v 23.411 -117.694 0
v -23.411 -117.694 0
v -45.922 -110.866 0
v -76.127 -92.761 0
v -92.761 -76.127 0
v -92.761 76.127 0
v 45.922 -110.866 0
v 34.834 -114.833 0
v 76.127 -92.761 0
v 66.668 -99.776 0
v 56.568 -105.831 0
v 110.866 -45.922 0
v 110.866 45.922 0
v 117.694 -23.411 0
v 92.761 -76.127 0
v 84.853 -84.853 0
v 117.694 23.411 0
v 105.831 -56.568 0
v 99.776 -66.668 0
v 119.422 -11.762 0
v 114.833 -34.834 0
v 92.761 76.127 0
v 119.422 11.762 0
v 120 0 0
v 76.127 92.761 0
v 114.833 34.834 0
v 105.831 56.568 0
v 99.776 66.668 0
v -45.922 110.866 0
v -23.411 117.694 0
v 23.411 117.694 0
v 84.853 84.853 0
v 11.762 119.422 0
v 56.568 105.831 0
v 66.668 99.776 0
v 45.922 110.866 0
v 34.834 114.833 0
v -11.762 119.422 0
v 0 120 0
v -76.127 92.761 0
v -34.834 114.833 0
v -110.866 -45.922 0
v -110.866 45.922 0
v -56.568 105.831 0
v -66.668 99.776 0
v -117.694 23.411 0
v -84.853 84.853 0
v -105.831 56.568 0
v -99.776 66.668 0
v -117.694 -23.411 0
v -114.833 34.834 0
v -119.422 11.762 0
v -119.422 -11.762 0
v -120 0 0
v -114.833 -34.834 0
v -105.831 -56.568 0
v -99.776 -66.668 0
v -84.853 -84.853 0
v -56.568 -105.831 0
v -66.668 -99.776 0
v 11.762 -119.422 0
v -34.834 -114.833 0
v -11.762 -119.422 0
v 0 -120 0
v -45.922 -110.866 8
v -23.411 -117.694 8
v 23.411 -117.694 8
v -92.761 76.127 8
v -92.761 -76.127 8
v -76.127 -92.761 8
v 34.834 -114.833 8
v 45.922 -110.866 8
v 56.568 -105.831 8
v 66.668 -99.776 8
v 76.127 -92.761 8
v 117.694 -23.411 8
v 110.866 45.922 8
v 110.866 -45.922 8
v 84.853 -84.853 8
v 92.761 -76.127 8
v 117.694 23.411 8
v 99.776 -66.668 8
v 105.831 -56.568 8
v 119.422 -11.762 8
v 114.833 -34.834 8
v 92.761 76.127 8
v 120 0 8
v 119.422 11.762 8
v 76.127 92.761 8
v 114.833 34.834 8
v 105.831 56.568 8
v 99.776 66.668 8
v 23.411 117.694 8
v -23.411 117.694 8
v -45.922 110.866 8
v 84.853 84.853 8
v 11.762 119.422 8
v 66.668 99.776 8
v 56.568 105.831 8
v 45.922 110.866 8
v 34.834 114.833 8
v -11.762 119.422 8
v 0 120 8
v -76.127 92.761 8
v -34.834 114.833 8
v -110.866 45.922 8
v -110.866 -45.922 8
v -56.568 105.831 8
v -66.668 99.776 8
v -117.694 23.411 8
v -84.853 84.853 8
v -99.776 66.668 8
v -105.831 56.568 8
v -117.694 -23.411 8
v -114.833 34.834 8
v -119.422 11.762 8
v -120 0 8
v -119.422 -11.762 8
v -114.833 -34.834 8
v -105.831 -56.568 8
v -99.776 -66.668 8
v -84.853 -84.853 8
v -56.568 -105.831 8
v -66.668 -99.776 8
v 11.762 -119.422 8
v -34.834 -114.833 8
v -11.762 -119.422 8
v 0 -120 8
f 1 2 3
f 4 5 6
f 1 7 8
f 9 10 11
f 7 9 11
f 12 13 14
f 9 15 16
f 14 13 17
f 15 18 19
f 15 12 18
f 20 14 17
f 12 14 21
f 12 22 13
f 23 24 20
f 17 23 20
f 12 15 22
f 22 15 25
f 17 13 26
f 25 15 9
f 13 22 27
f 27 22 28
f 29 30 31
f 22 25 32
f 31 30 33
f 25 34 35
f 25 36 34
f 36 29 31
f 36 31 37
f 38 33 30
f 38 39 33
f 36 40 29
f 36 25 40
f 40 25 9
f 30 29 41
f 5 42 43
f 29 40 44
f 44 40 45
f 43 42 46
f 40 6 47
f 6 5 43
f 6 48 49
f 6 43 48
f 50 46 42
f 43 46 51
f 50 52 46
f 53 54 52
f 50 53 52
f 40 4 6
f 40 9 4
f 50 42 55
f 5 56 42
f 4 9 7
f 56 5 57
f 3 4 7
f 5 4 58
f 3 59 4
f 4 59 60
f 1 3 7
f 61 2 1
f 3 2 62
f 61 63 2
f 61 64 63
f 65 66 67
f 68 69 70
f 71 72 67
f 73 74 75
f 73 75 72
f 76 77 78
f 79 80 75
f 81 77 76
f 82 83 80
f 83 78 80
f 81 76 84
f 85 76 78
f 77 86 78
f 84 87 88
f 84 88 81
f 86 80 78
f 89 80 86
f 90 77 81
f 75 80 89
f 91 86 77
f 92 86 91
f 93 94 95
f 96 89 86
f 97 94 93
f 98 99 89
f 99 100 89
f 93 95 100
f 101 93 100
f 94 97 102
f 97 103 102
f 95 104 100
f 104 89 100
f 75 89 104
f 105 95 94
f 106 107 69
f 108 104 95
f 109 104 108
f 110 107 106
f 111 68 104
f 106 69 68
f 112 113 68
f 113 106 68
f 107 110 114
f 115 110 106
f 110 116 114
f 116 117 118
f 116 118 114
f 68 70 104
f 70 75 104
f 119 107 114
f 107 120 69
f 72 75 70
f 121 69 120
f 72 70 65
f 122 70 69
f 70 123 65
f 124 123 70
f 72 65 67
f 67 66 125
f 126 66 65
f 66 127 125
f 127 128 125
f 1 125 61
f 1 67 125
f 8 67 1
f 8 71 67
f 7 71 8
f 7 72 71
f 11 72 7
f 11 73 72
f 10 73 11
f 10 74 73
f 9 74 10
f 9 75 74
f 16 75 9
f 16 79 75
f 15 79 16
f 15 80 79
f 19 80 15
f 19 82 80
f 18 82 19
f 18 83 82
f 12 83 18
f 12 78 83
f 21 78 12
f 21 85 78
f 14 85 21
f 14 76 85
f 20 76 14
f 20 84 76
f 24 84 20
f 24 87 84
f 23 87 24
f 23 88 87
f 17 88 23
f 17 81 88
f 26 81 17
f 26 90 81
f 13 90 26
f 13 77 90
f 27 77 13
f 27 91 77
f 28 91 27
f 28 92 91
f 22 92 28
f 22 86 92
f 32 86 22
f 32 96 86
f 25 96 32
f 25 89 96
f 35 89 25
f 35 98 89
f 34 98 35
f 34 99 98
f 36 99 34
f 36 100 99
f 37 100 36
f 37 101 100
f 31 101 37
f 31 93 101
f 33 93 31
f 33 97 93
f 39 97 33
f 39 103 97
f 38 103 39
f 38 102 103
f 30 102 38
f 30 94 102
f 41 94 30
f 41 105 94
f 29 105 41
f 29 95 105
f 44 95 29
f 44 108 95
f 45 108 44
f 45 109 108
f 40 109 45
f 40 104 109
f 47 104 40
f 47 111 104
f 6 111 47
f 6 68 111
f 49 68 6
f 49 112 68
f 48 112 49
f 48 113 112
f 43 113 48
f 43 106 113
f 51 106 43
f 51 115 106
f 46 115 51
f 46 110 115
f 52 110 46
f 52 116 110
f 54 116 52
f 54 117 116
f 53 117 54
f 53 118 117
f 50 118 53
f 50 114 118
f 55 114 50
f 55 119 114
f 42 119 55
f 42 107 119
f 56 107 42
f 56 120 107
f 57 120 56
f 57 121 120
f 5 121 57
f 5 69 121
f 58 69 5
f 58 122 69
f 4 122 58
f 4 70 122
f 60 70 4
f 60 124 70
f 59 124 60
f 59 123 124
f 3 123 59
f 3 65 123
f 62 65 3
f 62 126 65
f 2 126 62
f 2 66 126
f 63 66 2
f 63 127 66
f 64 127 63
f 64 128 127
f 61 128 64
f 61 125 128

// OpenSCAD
linear_extrude(height = 8)
  union() {
    circle(r = 120, $fn = 64);
    circle(r = 20, $fn = 64);
    translate([27.507, 19.985]) circle(r = 6, $fn = 64);
    translate([-10.507, 32.336]) circle(r = 6, $fn = 64);
    translate([-34, 0]) circle(r = 6, $fn = 64);
    translate([-10.507, -32.336]) circle(r = 6, $fn = 64);
    translate([27.507, -19.985]) circle(r = 6, $fn = 64);
    polygon([[48.907,10.396],[25,43.301],[50,86.603],[97.815,20.791]]);
    polygon([[5.226,49.726],[-33.456,37.157],[-66.913,74.314],[10.453,99.452]]);
    polygon([[-45.677,20.337],[-45.677,-20.337],[-91.355,-40.674],[-91.355,40.674]]);
    polygon([[-33.456,-37.157],[5.226,-49.726],[10.453,-99.452],[-66.913,-74.314]]);
    polygon([[25,-43.301],[48.907,-10.396],[97.815,-20.791],[50,-86.603]]);
  }
